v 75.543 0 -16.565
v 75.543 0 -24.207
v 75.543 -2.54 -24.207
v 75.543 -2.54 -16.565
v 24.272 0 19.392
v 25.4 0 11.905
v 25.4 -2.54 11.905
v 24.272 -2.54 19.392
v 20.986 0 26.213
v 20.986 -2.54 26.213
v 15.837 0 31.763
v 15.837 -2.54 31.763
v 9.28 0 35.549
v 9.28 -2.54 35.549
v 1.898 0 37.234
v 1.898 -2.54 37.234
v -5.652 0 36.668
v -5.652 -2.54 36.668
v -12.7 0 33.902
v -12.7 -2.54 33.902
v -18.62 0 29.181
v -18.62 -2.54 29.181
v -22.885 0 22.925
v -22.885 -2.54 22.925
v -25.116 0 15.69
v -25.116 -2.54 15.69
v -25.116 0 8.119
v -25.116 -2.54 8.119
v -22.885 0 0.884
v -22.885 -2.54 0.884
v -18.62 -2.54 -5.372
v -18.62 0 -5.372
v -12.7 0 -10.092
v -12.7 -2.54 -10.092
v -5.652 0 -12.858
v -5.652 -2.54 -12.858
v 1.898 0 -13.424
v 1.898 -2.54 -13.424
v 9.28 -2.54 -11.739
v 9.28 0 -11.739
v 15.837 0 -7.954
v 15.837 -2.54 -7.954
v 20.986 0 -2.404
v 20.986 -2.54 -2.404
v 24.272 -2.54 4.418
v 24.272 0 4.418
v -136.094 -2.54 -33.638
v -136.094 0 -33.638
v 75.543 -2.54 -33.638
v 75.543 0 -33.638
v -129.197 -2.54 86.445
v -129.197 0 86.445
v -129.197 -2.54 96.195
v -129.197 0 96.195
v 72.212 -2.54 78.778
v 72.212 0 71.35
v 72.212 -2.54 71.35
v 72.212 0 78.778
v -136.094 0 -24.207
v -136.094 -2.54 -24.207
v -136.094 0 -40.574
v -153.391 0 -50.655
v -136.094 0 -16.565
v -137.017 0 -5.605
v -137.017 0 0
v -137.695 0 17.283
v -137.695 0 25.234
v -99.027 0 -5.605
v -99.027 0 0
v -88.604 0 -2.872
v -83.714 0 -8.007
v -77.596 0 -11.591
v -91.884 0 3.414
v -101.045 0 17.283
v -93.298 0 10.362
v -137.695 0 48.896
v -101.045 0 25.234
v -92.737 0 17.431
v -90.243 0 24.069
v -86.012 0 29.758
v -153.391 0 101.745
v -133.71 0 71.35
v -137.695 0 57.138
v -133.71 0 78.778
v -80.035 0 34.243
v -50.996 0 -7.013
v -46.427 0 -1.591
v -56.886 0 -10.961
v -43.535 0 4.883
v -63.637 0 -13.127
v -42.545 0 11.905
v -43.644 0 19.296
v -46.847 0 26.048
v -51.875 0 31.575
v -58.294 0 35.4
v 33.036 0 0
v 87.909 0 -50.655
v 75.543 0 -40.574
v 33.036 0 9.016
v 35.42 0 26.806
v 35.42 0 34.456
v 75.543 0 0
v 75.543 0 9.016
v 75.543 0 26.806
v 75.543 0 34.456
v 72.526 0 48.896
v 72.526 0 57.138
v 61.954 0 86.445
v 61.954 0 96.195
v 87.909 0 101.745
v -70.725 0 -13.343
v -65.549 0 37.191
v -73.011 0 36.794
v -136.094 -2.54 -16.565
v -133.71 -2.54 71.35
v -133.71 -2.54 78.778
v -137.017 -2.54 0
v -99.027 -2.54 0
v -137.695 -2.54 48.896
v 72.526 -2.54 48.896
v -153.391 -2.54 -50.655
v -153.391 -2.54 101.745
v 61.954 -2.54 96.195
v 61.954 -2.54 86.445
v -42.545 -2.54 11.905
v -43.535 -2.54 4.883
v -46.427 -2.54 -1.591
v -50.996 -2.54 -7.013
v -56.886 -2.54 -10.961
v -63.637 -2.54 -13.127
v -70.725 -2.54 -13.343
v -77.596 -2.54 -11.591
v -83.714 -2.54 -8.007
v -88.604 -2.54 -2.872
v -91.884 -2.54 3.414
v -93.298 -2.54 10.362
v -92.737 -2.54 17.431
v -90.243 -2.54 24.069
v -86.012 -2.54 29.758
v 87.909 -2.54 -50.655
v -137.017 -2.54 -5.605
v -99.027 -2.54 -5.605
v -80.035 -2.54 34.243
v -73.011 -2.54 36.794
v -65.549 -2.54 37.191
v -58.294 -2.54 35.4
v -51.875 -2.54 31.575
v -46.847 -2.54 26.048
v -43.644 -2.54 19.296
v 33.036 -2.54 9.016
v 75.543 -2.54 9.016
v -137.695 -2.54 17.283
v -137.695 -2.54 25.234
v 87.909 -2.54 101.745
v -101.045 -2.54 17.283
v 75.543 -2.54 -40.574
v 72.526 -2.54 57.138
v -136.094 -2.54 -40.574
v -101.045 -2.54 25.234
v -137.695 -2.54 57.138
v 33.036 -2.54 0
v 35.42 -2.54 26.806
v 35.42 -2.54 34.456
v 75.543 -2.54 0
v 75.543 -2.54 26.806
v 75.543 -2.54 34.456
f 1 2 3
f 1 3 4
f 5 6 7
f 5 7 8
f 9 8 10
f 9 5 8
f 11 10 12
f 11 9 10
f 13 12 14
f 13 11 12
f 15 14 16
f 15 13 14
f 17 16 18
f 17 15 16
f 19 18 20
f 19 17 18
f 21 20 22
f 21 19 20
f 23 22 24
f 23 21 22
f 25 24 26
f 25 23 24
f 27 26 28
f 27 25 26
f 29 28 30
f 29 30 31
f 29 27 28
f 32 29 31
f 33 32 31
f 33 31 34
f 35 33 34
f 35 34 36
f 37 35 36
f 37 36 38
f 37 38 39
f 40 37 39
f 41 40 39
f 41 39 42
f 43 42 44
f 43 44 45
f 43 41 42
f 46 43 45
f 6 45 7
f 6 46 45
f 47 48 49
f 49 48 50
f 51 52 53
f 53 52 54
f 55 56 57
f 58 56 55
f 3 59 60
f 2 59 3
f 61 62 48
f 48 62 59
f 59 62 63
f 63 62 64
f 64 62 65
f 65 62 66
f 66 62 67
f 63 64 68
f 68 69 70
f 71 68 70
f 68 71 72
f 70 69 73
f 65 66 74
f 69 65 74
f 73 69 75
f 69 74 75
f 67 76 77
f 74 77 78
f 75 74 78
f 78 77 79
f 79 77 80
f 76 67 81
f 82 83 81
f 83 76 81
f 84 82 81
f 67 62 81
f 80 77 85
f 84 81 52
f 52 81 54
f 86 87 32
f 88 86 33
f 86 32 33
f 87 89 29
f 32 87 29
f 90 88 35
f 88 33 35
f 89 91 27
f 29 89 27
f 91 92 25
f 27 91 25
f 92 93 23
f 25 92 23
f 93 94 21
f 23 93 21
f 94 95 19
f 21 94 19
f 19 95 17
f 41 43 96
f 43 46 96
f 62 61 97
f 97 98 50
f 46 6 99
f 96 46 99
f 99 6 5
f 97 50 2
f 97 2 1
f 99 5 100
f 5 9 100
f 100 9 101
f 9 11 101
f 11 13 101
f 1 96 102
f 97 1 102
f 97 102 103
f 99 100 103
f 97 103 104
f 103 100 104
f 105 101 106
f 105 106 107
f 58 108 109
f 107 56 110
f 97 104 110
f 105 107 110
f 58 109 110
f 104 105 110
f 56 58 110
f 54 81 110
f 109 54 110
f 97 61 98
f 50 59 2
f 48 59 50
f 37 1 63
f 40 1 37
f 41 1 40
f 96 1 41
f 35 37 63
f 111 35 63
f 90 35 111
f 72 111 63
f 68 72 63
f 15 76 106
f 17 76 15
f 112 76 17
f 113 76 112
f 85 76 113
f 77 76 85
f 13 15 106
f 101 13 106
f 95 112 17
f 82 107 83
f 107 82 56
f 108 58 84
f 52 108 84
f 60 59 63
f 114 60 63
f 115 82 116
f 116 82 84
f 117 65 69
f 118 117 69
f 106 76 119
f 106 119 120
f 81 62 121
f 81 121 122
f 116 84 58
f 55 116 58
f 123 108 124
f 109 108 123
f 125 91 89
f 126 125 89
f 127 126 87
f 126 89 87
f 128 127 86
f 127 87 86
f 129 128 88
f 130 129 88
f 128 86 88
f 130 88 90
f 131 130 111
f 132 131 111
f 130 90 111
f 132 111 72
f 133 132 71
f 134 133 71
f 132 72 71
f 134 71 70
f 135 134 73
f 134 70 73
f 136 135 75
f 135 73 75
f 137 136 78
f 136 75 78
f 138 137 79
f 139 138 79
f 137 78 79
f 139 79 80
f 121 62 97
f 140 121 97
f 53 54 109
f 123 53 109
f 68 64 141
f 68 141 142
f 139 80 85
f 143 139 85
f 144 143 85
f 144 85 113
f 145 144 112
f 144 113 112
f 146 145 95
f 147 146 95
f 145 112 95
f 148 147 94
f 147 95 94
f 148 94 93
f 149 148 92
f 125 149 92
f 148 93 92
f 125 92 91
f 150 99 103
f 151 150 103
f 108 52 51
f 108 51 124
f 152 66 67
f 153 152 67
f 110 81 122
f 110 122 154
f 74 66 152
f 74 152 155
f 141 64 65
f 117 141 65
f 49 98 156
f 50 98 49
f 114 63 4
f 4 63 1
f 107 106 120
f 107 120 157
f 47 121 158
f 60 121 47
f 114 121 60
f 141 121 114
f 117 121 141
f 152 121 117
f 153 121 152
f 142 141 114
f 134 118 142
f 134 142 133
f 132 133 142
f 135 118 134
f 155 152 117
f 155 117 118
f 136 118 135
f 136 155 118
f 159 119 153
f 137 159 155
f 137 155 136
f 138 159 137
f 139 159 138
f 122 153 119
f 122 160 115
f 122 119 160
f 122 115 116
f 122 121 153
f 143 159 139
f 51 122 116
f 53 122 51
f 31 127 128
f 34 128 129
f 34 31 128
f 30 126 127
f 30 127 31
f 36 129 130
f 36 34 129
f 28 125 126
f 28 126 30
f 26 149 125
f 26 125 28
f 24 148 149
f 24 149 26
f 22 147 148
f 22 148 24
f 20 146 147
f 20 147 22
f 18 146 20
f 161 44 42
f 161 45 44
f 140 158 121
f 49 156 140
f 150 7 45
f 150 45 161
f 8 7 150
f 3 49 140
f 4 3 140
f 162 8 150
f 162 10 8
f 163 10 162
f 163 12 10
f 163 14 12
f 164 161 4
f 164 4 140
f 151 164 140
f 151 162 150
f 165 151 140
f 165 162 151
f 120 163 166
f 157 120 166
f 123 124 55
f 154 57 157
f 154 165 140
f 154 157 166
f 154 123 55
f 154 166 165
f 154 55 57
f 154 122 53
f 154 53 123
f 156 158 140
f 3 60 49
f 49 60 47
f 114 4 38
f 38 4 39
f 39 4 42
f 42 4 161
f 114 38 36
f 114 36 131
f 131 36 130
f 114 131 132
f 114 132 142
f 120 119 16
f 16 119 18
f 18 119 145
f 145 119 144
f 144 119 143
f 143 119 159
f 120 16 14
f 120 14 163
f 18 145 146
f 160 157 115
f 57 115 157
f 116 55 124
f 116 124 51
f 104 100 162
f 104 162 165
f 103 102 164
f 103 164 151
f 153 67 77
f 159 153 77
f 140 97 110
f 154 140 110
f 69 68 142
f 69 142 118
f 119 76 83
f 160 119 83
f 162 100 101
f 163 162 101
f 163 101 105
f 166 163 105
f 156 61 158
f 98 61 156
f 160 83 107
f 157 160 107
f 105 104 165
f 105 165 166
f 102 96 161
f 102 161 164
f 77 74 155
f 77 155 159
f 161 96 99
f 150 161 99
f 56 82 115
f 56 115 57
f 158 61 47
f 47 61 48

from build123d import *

# Parameters (mm, degrees)
F0_W     = 241.3
F0_H     = 152.4
F0_W_2   = 37.9902869463
F0_H_2   = 5.6053395383
F0_W_3   = 36.6508215666
F0_H_3   = 7.95059558
F0_W_4   = 211.6373926401
F0_H_4   = 6.9365315139
F0_H_5   = 7.6421592385
F0_R     = 25.4
F0_W_5   = 42.5071567297
F0_H_6   = 9.0162698179
F0_W_6   = 191.1512501538
F0_H_7   = 9.7504556179
F0_W_7   = 210.2212160826
F0_H_8   = 8.2425475121
F0_W_8   = 40.1230640709
F0_H_9   = 7.6498966664
F0_W_9   = 205.9216275811
F0_H_10  = 7.4272975326
F1_DEPTH = 2.54
F2_DEPTH = 2.54


with BuildPart() as f1:
    # F0 (on Front) → F1 (new body)
    with BuildSketch(Plane.XZ):
        with Locations((-32.7406, 25.5445336595)):
            Rectangle(F0_W, F0_H)
        with Locations((-118.0223450065, -2.8026697692)):
            Rectangle(F0_W_2, F0_H_2, mode=Mode.SUBTRACT)
        with Locations((-119.3700358272, 21.258618217)):
            Rectangle(F0_W_3, F0_H_3, mode=Mode.SUBTRACT)
        with BuildLine():
            ThreePointArc((-86.0117226839, 29.7584036313), (-58.2944755627, 35.3999965456), (-42.545, 11.9047336595))
            ThreePointArc((-42.545, 11.9047336595), (-77.5955244373, -11.5905292266), (-86.0117226839, 29.7584036313))
        make_face(mode=Mode.SUBTRACT)
        with Locations((-30.2752777934, -37.1060613543)):
            Rectangle(F0_W_4, F0_H_4, mode=Mode.SUBTRACT)
        with Locations((-30.2752777934, -20.3857226297)):
            Rectangle(F0_W_4, F0_H_5, mode=Mode.SUBTRACT)
        with Locations((0, 11.9047336595)):
            Circle(F0_R, mode=Mode.SUBTRACT)
        with Locations((54.2898401618, 4.508134909)):
            Rectangle(F0_W_5, F0_H_6, mode=Mode.SUBTRACT)
        with Locations((-33.6216446012, 91.3200601935)):
            Rectangle(F0_W_6, F0_H_7, mode=Mode.SUBTRACT)
        with Locations((-32.5848385692, 53.0171841383)):
            Rectangle(F0_W_7, F0_H_8, mode=Mode.SUBTRACT)
        with Locations((55.4818864912, 30.6309619918)):
            Rectangle(F0_W_8, F0_H_9, mode=Mode.SUBTRACT)
        with Locations((-30.7491086423, 75.0639848411)):
            Rectangle(F0_W_9, F0_H_10, mode=Mode.SUBTRACT)
    extrude(amount=F1_DEPTH)

    # F0 (on Front) → F2 (join)
    with BuildSketch(Plane.XZ):
        with Locations((-32.7406, 25.5445336595)):
            Rectangle(F0_W, F0_H)
        with Locations((-118.0223450065, -2.8026697692)):
            Rectangle(F0_W_2, F0_H_2, mode=Mode.SUBTRACT)
        with Locations((-119.3700358272, 21.258618217)):
            Rectangle(F0_W_3, F0_H_3, mode=Mode.SUBTRACT)
        with BuildLine():
            ThreePointArc((-86.0117226839, 29.7584036313), (-58.2944755627, 35.3999965456), (-42.545, 11.9047336595))
            ThreePointArc((-42.545, 11.9047336595), (-77.5955244373, -11.5905292266), (-86.0117226839, 29.7584036313))
        make_face(mode=Mode.SUBTRACT)
        with Locations((-30.2752777934, -37.1060613543)):
            Rectangle(F0_W_4, F0_H_4, mode=Mode.SUBTRACT)
        with Locations((-30.2752777934, -20.3857226297)):
            Rectangle(F0_W_4, F0_H_5, mode=Mode.SUBTRACT)
        with Locations((0, 11.9047336595)):
            Circle(F0_R, mode=Mode.SUBTRACT)
        with Locations((54.2898401618, 4.508134909)):
            Rectangle(F0_W_5, F0_H_6, mode=Mode.SUBTRACT)
        with Locations((-33.6216446012, 91.3200601935)):
            Rectangle(F0_W_6, F0_H_7, mode=Mode.SUBTRACT)
        with Locations((-32.5848385692, 53.0171841383)):
            Rectangle(F0_W_7, F0_H_8, mode=Mode.SUBTRACT)
        with Locations((55.4818864912, 30.6309619918)):
            Rectangle(F0_W_8, F0_H_9, mode=Mode.SUBTRACT)
        with Locations((-30.7491086423, 75.0639848411)):
            Rectangle(F0_W_9, F0_H_10, mode=Mode.SUBTRACT)
    extrude(amount=F2_DEPTH)


solid = f1.part
